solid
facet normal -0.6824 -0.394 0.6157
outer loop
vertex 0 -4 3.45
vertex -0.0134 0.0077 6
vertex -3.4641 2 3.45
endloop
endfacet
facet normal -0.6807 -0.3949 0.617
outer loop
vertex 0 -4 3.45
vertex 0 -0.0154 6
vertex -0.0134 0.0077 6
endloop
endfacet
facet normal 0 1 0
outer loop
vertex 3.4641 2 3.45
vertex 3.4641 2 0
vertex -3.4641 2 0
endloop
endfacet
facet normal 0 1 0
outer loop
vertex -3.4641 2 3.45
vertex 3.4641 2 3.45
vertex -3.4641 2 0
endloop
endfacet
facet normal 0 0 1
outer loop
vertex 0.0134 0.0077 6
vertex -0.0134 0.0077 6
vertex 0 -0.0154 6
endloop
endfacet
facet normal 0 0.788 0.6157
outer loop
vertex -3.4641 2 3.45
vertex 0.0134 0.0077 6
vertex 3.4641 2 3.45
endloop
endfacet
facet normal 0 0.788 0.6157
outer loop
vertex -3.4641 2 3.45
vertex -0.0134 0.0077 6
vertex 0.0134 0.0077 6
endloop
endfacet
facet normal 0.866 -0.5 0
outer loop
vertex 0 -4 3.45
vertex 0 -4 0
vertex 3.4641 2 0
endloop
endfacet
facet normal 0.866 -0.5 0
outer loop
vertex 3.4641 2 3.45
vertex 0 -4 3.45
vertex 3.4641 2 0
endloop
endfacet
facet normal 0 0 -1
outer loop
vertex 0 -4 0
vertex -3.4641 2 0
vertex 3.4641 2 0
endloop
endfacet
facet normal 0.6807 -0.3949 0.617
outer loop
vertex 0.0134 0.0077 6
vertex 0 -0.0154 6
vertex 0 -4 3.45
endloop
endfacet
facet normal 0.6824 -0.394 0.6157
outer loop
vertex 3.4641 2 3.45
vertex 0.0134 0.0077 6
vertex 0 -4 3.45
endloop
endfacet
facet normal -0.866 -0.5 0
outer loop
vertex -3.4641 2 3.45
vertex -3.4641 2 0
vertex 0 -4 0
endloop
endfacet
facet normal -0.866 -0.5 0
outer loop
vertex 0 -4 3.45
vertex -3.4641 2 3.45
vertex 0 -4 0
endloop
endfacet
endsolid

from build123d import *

# Parameters (mm, degrees)
F1_DEPTH = 6
F2_SIZE2 = 1.992278
F2_SIZE  = 2.55


with BuildPart() as f1:
    # F0 (on Top) → F1 (new body)
    with BuildSketch(Plane.XY):
        Polygon((3.464102, 2), (-3.464102, 2), (0, -4), align=None)
    extrude(amount=F1_DEPTH)

    # F2
    f2_edges = [f1.edges().sort_by_distance(p)[0] for p in [
        (1.732051, -1, 6),
        (-1.732051, -1, 6),
        (0, 2, 6),
    ]]
    chamfer(f2_edges, length=F2_SIZE, length2=F2_SIZE2)


solid = f1.part
